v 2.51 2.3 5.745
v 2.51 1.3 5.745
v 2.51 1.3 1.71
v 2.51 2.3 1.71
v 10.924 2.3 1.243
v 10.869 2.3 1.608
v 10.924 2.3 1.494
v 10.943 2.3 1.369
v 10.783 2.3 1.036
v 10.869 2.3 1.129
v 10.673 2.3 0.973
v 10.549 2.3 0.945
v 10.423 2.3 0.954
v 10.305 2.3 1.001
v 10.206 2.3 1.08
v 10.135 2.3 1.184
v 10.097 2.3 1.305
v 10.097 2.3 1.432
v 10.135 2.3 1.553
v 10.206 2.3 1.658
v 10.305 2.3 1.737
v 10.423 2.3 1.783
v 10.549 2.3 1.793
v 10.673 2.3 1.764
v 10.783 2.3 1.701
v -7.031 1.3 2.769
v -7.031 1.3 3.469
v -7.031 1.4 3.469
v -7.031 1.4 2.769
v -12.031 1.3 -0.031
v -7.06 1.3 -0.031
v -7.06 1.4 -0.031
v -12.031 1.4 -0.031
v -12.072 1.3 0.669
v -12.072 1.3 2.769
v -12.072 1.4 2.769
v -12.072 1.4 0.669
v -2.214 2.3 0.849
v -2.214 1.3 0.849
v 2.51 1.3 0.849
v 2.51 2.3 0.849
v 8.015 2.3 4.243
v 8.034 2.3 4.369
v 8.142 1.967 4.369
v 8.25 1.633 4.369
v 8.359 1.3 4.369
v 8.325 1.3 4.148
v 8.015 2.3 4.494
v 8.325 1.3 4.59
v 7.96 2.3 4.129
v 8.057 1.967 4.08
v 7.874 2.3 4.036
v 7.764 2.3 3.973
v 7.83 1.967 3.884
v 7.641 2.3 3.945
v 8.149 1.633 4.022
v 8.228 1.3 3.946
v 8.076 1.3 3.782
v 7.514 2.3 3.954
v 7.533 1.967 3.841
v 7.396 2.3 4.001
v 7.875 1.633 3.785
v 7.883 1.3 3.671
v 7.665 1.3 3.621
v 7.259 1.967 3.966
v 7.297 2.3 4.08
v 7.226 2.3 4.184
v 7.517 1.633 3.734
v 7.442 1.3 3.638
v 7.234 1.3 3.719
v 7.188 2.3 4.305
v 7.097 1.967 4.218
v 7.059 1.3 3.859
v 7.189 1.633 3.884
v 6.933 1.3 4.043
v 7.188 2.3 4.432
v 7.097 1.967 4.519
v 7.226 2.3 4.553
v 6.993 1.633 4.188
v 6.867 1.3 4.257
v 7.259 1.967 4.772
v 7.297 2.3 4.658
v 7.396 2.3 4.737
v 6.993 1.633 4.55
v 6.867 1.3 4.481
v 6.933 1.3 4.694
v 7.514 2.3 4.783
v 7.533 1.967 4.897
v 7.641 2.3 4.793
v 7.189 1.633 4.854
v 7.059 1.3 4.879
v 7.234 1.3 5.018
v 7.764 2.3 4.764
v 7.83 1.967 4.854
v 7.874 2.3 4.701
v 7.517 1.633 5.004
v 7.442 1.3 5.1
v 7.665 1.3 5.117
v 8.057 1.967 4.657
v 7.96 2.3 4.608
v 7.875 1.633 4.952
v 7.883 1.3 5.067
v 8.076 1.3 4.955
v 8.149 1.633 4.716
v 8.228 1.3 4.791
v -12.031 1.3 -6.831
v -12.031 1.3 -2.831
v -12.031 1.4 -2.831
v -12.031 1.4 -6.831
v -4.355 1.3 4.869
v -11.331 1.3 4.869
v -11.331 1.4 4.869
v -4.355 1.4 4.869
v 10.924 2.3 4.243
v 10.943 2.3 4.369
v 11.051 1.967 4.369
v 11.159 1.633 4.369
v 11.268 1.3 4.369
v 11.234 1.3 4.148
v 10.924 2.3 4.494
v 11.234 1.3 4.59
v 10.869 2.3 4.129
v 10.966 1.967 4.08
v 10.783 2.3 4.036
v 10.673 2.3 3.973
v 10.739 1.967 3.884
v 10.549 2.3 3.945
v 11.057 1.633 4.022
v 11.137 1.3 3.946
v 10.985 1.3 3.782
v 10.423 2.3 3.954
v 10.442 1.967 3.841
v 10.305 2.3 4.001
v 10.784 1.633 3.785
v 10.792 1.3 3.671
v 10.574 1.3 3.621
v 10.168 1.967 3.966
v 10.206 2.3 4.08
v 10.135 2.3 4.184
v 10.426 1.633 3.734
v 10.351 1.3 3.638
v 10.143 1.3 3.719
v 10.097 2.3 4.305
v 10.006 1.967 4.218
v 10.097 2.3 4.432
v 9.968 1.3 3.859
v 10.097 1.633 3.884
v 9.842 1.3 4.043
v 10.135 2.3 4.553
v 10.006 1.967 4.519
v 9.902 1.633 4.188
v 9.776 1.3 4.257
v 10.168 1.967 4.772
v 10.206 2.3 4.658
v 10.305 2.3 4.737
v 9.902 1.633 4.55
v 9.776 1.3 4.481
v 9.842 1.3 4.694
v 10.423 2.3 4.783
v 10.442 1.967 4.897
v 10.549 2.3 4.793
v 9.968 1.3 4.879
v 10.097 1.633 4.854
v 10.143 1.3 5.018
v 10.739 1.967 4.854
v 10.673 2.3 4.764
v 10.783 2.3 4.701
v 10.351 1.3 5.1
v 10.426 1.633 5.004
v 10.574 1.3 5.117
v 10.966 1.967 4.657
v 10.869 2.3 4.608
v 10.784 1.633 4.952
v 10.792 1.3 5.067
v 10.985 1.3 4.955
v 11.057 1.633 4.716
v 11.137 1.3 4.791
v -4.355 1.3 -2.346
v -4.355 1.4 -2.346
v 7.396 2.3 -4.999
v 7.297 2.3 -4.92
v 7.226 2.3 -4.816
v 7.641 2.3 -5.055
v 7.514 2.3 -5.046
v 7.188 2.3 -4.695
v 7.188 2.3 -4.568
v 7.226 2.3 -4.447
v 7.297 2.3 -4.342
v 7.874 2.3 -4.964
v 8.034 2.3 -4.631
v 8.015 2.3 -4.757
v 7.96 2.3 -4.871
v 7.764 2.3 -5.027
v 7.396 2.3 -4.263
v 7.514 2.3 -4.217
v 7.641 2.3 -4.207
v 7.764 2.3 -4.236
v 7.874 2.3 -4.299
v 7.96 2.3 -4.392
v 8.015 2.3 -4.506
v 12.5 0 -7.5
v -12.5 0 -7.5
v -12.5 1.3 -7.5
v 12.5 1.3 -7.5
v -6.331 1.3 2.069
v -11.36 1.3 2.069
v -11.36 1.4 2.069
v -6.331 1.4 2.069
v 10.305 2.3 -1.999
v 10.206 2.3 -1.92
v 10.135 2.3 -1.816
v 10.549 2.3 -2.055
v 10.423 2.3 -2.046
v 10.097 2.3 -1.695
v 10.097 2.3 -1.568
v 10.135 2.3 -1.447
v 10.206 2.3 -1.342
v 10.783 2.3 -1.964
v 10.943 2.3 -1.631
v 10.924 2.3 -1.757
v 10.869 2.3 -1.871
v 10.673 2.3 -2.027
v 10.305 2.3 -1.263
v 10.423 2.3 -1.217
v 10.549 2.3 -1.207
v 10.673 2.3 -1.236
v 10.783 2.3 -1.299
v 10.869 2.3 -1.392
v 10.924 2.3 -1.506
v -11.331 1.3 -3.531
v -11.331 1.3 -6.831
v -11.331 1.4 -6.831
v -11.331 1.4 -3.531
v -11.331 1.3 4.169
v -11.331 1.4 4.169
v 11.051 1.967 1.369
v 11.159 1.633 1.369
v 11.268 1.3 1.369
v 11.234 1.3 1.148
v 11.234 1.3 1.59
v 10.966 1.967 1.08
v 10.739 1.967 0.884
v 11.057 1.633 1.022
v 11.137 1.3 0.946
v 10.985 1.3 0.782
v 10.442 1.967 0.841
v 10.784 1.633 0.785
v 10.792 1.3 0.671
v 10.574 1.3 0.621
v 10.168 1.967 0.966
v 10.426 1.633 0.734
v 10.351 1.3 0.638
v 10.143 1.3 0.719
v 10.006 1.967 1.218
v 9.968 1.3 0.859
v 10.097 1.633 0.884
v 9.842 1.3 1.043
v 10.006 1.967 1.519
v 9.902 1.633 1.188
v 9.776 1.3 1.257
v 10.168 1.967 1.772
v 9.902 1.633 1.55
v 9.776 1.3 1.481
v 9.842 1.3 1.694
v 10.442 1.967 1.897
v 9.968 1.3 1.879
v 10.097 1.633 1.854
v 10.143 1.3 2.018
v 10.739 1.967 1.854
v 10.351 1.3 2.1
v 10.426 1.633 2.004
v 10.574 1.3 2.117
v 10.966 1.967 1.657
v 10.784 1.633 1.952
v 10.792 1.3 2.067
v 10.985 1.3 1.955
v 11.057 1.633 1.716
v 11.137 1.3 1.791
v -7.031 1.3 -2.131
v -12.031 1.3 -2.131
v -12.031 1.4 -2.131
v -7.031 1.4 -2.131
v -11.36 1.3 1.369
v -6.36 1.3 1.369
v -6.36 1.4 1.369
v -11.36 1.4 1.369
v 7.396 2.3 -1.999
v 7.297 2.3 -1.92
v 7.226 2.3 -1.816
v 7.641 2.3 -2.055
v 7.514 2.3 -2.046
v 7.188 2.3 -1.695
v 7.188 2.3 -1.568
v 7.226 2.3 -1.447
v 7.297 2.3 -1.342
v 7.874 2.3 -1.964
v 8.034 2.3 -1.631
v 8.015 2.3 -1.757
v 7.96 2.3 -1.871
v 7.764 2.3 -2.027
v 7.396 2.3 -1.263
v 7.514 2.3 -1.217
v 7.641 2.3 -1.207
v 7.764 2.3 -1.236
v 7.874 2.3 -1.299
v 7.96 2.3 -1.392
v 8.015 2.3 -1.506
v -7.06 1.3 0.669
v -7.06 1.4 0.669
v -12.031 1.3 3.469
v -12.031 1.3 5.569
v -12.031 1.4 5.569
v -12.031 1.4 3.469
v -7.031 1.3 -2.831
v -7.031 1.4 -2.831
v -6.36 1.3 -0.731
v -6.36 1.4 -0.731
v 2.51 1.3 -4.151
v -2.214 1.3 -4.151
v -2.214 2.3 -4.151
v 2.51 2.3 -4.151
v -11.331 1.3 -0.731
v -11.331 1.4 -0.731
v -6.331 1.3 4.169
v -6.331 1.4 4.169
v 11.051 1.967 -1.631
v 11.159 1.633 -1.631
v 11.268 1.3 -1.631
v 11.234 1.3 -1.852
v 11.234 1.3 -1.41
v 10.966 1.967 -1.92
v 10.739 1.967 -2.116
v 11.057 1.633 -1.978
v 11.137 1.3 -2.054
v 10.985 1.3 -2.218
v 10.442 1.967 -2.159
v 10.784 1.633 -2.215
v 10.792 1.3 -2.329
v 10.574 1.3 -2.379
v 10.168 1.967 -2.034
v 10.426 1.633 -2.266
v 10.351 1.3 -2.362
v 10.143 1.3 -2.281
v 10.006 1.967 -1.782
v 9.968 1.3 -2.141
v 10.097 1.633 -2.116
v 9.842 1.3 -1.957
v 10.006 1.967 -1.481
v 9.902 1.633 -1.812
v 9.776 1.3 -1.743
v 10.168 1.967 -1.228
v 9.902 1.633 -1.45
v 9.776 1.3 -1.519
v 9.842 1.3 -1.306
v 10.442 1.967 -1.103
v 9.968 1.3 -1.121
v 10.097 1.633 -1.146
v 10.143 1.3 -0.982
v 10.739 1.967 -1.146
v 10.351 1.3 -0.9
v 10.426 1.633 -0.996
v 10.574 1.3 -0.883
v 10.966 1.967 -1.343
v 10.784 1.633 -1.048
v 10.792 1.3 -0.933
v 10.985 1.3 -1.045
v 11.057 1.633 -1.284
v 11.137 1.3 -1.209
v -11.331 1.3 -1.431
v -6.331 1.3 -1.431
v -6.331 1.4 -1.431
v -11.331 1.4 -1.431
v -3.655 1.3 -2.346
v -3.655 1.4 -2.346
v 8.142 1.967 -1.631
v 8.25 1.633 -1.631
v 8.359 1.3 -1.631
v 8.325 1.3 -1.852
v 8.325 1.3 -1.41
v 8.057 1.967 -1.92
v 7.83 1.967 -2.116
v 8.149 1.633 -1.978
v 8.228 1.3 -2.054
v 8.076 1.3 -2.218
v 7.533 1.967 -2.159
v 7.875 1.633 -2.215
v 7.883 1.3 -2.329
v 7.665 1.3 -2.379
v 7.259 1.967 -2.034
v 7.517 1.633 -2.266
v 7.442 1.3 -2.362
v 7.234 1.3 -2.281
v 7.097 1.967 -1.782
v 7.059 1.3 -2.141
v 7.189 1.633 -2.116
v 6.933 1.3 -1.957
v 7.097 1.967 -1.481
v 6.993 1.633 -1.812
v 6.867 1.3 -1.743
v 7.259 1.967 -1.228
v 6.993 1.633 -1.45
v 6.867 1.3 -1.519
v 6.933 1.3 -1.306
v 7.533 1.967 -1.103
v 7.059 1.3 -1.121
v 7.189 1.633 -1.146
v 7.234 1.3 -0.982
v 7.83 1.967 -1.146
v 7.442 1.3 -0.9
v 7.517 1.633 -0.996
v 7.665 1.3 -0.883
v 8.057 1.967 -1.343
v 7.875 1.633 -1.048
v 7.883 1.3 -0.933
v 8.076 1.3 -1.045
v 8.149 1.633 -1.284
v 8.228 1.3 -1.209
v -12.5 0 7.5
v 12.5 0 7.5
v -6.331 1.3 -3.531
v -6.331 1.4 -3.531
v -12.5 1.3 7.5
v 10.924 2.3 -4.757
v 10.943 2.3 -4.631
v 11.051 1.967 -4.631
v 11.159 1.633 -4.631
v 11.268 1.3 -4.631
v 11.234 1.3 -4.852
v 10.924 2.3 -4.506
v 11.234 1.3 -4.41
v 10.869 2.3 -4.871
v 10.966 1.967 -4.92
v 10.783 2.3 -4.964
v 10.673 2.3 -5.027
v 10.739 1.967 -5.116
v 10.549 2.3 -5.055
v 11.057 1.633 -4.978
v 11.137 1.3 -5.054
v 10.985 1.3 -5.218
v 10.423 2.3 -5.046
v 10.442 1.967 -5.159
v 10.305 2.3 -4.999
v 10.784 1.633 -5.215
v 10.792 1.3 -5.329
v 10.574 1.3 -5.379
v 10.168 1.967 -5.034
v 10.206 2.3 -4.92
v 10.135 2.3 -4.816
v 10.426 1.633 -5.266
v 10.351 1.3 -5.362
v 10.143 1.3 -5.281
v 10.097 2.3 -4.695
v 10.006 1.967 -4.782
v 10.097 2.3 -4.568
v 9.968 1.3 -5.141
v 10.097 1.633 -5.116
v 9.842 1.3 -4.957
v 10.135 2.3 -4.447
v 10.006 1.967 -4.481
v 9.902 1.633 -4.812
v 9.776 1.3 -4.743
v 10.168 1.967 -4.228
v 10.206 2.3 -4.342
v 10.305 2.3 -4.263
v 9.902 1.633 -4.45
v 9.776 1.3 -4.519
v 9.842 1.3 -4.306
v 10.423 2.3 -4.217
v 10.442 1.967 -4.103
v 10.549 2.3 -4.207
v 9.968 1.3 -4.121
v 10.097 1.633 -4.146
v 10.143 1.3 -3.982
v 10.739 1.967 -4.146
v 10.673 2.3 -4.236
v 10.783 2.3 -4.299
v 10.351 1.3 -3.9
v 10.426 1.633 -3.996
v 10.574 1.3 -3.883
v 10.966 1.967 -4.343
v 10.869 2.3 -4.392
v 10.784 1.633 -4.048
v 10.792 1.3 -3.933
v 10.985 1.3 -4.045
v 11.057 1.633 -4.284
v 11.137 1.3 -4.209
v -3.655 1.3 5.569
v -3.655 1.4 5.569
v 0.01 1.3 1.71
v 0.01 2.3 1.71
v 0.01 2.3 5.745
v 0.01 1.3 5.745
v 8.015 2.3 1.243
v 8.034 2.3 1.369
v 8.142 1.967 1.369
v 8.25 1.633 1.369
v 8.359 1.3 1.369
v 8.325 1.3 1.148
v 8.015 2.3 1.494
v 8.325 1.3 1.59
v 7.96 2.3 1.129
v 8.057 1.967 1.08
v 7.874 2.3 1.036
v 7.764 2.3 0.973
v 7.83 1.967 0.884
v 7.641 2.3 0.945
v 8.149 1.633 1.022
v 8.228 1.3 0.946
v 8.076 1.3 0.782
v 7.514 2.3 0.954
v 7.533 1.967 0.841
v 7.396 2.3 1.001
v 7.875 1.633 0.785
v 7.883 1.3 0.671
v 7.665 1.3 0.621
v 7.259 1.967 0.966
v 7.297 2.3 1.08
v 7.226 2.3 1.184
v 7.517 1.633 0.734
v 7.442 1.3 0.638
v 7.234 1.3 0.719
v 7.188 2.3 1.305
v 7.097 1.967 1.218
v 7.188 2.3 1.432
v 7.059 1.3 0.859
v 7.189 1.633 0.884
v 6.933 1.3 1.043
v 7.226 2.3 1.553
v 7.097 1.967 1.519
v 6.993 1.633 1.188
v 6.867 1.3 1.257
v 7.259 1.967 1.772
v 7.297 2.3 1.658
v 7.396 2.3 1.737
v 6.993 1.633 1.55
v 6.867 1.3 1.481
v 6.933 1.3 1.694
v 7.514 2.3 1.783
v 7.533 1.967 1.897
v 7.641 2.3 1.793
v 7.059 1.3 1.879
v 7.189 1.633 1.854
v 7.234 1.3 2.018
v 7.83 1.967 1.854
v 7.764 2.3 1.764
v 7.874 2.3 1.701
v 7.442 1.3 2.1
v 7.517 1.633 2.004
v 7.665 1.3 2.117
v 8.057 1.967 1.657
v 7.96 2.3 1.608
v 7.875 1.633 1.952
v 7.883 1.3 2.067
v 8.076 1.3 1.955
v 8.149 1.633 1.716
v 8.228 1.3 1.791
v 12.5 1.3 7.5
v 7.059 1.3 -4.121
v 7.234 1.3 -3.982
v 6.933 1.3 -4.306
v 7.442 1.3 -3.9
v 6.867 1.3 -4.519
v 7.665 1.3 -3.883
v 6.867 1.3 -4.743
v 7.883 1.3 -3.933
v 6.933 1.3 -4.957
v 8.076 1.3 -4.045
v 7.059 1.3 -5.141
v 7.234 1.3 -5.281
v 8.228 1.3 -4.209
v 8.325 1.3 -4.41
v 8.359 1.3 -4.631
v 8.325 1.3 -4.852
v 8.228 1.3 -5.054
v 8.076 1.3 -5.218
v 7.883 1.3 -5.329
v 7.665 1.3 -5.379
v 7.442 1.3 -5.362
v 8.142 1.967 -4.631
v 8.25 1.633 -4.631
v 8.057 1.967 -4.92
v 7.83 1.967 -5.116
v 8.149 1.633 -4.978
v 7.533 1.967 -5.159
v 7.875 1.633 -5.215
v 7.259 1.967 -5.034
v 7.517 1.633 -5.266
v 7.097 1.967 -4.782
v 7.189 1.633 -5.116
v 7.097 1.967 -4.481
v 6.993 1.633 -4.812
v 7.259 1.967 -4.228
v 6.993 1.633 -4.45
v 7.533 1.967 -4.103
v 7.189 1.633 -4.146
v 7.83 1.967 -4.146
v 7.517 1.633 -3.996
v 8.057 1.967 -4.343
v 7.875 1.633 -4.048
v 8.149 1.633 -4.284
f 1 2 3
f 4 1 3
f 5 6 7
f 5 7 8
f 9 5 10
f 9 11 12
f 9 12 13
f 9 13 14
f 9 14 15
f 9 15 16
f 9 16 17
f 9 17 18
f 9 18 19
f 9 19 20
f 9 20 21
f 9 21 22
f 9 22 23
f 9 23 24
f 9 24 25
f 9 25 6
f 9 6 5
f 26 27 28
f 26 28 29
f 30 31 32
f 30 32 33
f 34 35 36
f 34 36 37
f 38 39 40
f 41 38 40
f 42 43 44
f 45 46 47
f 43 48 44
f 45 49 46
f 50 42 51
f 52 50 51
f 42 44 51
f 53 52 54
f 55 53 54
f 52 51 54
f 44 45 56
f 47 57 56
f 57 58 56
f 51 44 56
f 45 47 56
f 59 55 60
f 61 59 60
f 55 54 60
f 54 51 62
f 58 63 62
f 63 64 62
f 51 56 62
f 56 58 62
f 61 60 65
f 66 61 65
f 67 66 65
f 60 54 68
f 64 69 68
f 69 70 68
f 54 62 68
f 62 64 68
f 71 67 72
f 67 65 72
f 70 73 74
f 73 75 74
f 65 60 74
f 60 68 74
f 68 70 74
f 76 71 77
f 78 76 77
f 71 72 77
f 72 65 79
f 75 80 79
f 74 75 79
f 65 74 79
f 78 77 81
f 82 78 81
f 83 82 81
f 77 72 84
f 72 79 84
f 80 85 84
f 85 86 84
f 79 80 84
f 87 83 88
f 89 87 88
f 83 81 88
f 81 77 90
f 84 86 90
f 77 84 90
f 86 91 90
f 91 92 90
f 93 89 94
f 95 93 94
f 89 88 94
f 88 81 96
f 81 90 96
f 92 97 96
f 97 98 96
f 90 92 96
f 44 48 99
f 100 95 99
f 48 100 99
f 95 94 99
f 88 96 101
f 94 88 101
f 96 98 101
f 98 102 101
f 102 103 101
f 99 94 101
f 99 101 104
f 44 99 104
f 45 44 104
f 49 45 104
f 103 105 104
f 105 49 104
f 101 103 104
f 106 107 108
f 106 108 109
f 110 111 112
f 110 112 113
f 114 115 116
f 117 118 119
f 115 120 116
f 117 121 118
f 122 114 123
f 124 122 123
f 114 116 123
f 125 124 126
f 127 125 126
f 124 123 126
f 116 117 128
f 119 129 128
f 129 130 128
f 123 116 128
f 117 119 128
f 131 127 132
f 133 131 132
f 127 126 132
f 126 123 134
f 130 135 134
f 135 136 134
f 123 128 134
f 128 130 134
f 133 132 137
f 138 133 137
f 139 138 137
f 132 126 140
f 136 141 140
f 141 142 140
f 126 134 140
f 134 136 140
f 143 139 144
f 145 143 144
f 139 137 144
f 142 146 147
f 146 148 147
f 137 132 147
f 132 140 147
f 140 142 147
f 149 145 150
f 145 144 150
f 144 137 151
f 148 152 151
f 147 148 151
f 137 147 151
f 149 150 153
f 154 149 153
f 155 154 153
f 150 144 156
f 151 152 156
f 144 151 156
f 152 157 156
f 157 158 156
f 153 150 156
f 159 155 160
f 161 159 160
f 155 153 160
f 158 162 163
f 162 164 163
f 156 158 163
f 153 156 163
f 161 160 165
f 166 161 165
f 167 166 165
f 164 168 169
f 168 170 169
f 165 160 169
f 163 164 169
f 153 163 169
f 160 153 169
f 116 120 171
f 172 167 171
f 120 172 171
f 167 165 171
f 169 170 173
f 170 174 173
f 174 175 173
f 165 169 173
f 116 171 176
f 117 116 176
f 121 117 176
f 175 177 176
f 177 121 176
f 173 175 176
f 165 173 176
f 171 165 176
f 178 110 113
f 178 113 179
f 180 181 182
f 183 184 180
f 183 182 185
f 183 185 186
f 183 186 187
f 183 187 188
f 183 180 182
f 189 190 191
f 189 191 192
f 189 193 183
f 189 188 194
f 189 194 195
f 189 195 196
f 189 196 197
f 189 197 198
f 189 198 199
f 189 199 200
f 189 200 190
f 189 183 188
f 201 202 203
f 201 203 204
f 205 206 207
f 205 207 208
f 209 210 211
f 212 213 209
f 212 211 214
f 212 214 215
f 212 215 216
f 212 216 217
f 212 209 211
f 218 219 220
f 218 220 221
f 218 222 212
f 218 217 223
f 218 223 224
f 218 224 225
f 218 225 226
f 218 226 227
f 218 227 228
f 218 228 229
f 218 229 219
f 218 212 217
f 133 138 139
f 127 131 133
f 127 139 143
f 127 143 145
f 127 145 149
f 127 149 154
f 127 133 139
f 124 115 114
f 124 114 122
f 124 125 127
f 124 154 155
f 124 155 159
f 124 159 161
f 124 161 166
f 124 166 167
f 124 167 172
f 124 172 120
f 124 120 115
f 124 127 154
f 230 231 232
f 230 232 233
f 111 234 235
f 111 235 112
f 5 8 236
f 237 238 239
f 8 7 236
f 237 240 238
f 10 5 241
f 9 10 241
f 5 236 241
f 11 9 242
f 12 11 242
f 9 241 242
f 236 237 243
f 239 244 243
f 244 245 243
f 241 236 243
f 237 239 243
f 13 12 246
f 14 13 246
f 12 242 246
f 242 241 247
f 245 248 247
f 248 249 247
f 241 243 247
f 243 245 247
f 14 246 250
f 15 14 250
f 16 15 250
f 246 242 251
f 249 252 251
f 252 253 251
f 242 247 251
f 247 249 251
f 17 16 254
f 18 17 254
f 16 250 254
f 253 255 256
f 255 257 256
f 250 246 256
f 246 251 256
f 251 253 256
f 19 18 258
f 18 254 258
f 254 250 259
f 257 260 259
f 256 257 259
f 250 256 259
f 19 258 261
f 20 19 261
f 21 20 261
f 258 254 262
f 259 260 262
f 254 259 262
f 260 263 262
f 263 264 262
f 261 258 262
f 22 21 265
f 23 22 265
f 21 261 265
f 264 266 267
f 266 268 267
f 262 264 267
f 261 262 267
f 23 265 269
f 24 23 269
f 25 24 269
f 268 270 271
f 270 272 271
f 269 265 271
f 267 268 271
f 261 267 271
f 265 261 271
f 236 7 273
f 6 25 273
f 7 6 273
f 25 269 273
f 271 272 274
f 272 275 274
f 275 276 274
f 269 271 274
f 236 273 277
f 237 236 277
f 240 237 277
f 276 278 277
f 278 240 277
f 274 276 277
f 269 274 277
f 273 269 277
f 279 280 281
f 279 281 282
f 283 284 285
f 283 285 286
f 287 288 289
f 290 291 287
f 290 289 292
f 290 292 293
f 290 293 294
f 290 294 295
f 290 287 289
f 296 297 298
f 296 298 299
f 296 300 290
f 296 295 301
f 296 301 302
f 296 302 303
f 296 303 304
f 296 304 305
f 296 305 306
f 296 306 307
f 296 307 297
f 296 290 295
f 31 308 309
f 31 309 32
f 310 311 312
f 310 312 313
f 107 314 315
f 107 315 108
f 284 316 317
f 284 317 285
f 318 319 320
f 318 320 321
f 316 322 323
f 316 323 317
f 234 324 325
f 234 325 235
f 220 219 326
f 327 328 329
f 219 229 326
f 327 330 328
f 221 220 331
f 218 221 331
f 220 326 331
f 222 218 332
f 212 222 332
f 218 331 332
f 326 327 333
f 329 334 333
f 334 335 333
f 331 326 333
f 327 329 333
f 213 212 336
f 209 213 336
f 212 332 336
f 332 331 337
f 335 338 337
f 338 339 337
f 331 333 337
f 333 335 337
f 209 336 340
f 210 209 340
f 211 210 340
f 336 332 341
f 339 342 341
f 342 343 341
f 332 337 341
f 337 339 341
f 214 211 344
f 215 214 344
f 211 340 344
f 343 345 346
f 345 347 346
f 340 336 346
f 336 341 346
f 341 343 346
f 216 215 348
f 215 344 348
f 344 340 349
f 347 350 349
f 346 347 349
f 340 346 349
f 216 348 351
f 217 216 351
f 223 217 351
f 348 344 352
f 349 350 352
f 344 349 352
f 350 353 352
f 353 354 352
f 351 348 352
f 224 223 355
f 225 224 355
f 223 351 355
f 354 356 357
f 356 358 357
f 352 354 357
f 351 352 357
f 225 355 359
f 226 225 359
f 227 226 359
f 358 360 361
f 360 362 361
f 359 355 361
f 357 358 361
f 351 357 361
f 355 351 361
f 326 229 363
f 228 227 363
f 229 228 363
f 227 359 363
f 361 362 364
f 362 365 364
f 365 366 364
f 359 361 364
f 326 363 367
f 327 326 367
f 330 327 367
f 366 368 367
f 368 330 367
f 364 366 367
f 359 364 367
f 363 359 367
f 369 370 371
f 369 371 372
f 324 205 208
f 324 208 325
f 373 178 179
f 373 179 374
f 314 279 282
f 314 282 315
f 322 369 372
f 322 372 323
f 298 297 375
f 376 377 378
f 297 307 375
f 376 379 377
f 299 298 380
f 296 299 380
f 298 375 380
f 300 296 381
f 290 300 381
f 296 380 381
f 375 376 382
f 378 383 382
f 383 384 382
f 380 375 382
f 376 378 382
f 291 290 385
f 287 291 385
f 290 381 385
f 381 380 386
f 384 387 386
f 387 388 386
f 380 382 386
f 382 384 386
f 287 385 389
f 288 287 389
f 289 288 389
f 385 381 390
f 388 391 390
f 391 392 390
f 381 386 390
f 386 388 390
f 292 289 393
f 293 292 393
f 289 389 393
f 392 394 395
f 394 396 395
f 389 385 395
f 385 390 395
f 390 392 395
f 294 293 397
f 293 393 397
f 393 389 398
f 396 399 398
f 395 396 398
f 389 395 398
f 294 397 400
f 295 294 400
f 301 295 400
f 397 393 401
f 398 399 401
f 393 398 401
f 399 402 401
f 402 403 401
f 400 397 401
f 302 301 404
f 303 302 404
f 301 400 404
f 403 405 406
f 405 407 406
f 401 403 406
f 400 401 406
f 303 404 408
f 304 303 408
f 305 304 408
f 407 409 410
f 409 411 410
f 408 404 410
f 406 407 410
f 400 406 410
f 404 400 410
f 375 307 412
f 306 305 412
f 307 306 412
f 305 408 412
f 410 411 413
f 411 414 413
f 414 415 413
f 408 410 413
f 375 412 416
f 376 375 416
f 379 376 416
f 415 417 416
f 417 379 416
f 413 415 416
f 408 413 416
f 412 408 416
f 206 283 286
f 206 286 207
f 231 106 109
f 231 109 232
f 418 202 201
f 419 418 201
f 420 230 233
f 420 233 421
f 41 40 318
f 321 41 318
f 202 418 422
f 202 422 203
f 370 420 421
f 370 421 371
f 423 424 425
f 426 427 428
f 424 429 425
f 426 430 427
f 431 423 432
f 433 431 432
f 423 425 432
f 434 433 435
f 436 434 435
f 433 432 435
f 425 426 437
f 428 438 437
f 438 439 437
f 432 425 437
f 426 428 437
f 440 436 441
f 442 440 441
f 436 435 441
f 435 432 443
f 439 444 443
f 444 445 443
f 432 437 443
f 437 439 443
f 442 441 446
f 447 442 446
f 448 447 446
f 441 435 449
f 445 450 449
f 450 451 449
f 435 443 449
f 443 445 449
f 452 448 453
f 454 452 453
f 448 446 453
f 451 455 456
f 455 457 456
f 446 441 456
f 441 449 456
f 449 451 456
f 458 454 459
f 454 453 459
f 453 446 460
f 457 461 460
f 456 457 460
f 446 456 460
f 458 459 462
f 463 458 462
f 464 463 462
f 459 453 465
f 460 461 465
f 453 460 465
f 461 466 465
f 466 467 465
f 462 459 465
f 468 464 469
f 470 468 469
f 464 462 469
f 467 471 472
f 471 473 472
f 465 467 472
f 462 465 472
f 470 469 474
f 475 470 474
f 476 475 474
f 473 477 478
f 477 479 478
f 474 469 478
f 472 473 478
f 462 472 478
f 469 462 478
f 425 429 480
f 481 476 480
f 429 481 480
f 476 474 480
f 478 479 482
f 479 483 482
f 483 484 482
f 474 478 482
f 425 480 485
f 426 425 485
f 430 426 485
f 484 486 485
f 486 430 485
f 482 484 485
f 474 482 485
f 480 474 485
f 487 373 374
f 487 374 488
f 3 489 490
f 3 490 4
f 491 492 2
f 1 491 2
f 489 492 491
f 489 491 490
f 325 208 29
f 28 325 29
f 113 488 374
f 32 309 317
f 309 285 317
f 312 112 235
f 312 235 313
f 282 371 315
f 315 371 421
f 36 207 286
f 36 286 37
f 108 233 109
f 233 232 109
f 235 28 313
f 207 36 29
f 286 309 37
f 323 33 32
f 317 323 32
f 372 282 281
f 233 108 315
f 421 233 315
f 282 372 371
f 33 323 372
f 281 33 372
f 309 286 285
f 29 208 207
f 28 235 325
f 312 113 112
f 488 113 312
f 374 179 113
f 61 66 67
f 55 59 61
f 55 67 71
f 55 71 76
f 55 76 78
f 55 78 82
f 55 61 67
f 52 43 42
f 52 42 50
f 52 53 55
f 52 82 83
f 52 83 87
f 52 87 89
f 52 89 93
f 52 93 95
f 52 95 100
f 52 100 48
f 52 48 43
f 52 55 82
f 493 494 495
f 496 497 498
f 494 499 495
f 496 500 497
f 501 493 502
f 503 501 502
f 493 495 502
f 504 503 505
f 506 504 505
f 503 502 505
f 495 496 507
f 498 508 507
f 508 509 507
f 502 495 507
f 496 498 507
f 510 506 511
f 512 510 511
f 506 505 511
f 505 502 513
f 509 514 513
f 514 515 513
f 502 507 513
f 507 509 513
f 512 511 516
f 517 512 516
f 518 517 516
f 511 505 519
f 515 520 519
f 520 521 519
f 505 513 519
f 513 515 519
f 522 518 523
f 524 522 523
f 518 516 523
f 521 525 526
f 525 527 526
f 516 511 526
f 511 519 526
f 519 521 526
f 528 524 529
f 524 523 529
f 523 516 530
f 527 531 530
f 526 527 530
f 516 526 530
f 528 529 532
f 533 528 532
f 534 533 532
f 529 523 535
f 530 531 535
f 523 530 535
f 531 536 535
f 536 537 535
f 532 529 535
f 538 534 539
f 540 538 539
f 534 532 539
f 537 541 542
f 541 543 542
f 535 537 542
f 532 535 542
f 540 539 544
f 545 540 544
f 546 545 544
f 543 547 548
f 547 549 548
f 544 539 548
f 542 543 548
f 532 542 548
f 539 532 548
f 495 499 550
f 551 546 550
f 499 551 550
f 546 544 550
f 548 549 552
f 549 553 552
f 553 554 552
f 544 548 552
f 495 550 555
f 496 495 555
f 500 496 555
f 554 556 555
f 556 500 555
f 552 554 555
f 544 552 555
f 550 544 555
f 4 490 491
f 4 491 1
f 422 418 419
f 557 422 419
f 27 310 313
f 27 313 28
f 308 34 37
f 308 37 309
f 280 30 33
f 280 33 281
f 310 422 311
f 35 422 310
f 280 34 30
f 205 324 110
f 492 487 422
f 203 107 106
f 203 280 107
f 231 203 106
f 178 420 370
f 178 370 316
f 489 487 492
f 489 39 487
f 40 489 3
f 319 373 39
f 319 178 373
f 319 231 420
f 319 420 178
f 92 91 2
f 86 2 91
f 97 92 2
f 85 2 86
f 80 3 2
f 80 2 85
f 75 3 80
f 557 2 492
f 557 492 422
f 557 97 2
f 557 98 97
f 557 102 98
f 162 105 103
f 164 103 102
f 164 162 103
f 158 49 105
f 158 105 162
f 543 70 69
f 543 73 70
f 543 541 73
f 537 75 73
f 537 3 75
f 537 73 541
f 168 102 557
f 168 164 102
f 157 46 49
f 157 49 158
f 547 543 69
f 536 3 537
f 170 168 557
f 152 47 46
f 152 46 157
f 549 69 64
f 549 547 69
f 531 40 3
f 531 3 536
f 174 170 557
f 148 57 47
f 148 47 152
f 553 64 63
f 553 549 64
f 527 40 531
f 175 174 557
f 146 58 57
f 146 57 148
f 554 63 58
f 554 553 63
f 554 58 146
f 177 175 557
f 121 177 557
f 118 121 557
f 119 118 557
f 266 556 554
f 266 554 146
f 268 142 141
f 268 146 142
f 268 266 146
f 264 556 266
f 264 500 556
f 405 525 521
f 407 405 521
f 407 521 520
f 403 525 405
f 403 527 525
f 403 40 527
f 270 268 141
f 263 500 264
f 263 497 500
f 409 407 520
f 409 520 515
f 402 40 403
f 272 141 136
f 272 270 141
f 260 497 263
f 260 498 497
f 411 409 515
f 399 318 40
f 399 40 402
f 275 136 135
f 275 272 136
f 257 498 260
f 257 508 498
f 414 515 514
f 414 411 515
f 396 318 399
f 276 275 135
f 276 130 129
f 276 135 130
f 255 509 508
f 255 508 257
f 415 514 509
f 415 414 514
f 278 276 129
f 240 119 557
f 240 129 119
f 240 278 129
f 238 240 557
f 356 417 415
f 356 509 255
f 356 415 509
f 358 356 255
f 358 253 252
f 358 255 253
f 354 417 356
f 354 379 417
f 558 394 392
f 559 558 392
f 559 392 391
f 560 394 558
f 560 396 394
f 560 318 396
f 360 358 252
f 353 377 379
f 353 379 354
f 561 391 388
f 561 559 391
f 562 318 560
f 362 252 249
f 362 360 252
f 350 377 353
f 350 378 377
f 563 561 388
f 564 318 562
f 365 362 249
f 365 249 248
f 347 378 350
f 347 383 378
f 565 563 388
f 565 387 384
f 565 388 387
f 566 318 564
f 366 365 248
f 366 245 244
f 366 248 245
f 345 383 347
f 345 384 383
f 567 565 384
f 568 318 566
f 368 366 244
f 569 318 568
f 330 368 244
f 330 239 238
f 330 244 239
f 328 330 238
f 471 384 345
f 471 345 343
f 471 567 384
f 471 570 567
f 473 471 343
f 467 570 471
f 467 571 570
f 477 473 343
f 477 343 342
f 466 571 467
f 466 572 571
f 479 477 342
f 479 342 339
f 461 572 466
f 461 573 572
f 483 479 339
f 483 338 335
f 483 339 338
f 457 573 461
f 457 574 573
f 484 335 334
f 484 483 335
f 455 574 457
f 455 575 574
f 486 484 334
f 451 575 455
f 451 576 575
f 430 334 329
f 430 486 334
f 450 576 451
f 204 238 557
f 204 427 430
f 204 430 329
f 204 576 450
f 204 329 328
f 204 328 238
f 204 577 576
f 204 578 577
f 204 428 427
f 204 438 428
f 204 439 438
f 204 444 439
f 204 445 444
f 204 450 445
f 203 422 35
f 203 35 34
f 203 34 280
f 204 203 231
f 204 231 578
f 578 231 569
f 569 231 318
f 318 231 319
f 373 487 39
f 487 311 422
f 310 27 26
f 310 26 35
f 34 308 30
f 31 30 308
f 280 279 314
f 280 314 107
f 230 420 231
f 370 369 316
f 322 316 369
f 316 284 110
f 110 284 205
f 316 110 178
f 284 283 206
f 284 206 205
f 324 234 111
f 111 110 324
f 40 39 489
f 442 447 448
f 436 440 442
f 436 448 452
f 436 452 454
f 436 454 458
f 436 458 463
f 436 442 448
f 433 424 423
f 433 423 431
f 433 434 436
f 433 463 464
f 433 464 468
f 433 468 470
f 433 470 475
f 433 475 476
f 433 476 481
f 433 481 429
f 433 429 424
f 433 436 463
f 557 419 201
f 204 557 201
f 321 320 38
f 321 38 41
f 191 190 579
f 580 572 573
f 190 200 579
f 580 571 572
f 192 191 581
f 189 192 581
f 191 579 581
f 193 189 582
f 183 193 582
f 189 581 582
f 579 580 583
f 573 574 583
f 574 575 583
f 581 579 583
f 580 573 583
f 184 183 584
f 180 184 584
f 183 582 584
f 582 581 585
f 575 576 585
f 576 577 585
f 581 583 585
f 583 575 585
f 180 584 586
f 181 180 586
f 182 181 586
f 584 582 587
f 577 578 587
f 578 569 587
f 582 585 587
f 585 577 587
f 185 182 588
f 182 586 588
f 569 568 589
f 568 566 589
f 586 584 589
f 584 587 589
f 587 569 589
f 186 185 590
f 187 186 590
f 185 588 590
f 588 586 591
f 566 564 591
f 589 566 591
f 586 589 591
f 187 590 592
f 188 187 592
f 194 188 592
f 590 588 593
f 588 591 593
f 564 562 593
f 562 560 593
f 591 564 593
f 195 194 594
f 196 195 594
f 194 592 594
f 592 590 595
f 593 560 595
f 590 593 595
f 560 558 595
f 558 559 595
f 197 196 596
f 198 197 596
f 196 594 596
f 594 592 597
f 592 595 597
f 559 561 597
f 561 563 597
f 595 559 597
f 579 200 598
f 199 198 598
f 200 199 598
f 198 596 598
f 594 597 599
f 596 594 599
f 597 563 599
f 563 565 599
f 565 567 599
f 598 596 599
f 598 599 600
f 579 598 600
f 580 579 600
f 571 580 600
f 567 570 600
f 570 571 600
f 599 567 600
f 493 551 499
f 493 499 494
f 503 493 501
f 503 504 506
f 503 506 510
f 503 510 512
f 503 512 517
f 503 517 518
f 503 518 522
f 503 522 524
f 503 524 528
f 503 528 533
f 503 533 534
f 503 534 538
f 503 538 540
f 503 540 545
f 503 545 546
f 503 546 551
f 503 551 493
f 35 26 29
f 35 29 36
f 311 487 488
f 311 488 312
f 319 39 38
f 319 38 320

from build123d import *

# Parameters (mm, degrees)
SKETCH1_W                     = 25
SKETCH1_H                     = 15
BOSS_EXTRUDE1_DEPTH           = 1.3
BOSS_EXTRUDE2_DEPTH           = 0.1
SKETCH3_W                     = 4.723765288
SKETCH3_H                     = 5
SKETCH3_W_2                   = 2.5
SKETCH3_H_2                   = 4.03488285
BOSS_EXTRUDE3_DEPTH           = 1
SKETCH4_R                     = 0.75
BOSS_EXTRUDE4_DEPTH           = 1
BOSS_EXTRUDE4_DRAFT           = 18
BOSS_EXTRUDE4_PROFILE_2_DEPTH = 1
BOSS_EXTRUDE4_PROFILE_2_DRAFT = 18
BOSS_EXTRUDE4_PROFILE_3_DEPTH = 1
BOSS_EXTRUDE4_PROFILE_3_DRAFT = 18
BOSS_EXTRUDE4_PROFILE_4_DEPTH = 1
BOSS_EXTRUDE4_PROFILE_4_DRAFT = 18
BOSS_EXTRUDE4_PROFILE_5_DEPTH = 1
BOSS_EXTRUDE4_PROFILE_5_DRAFT = 18
BOSS_EXTRUDE4_PROFILE_6_DEPTH = 1
BOSS_EXTRUDE4_PROFILE_6_DRAFT = 18
BOSS_EXTRUDE4_PROFILE_7_DEPTH = 1
BOSS_EXTRUDE4_PROFILE_7_DRAFT = 18
BOSS_EXTRUDE4_PROFILE_8_DEPTH = 1
BOSS_EXTRUDE4_PROFILE_8_DRAFT = 18


with BuildPart() as part:
    # Sketch1 → Boss-Extrude1 (new body)
    with BuildSketch(Plane(origin=(0, 0, 0), x_dir=(1, 0, 0), z_dir=(0, 1, 0))):
        Rectangle(SKETCH1_W, SKETCH1_H)
    extrude(amount=BOSS_EXTRUDE1_DEPTH)

    # Sketch2 → Boss-Extrude2 (add)
    with BuildSketch(Plane(origin=(0, 1.3, 0), x_dir=(1, 0, 0), z_dir=(0, 1, 0))):
        Polygon((-3.654721125, -5.569339468), (-12.030839718, -5.569339468), (-12.030839718, -3.469339468), (-7.030839718, -3.469339468), (-7.030839718, -2.769339468), (-12.071748872, -2.769339468), (-12.071748872, -0.669339468), (-7.060469733, -0.669339468), (-7.060469733, 0.030660532), (-12.030839718, 0.030660532), (-12.030839718, 2.130660532), (-7.030839718, 2.130660532), (-7.030839718, 2.830660532), (-12.030839718, 2.830660532), (-12.030839718, 6.830660532), (-11.330839718, 6.830660532), (-11.330839718, 3.530660532), (-6.330839718, 3.530660532), (-6.330839718, 1.430660532), (-11.330839718, 1.430660532), (-11.330839718, 0.730660532), (-6.360469733, 0.730660532), (-6.360469733, -1.369339468), (-11.360469733, -1.369339468), (-11.360469733, -2.069339468), (-6.330839718, -2.069339468), (-6.330839718, -4.169339468), (-11.330839718, -4.169339468), (-11.330839718, -4.869339468), (-4.354721125, -4.869339468), (-4.354721125, 2.346150012), (-3.654721125, 2.346150012), align=None)
    extrude(amount=BOSS_EXTRUDE2_DEPTH)

    # Sketch3 → Boss-Extrude3 (add)
    with BuildSketch(Plane(origin=(0, 1.3, 0), x_dir=(1, 0, 0), z_dir=(0, 1, 0))):
        with Locations((0.147617665, 1.651198425)):
            Rectangle(SKETCH3_W, SKETCH3_H)
        with Locations((1.259500309, -3.727346048)):
            Rectangle(SKETCH3_W_2, SKETCH3_H_2)
    extrude(amount=BOSS_EXTRUDE3_DEPTH)


with BuildPart() as boss_extrude4_tool:
    # Sketch4 → Boss-Extrude4 (with draft: the straight prism first)
    with BuildSketch(Plane(origin=(0, 1.3, 0), x_dir=(1, 0, 0), z_dir=(0, 1, 0))):
        with Locations((7.608740396, 4.631238018)):
            Circle(SKETCH4_R)
    extrude(amount=BOSS_EXTRUDE4_DEPTH)
    # Boss-Extrude4: the draft: its side faces are tilted about the plane it starts from
    boss_extrude4_sides = [boss_extrude4_tool.faces().sort_by_distance(p)[0] for p in [
        (6.858740396, 1.8, -4.631238018),
    ]]
    draft(boss_extrude4_sides, Plane(origin=(0, 1.3, 0), x_dir=(1, 0, 0), z_dir=(0, 1, 0)), BOSS_EXTRUDE4_DRAFT)


with BuildPart() as part_1:
    add(part.part)

    # Boss-Extrude4: add boss_extrude4_tool
    add(boss_extrude4_tool.part)


with BuildPart() as boss_extrude4_profile_2_tool:
    # Sketch4 → Boss-Extrude4 profile 2 (with draft: the straight prism first)
    with BuildSketch(Plane(origin=(0, 1.3, 0), x_dir=(1, 0, 0), z_dir=(0, 1, 0))):
        with Locations((10.517617168, 4.631238018)):
            Circle(SKETCH4_R)
    extrude(amount=BOSS_EXTRUDE4_PROFILE_2_DEPTH)
    # Boss-Extrude4 profile 2: the draft: its side faces are tilted about the plane it starts from
    boss_extrude4_profile_2_sides = [boss_extrude4_profile_2_tool.faces().sort_by_distance(p)[0] for p in [
        (9.767617168, 1.8, -4.631238018),
    ]]
    draft(boss_extrude4_profile_2_sides, Plane(origin=(0, 1.3, 0), x_dir=(1, 0, 0), z_dir=(0, 1, 0)), BOSS_EXTRUDE4_PROFILE_2_DRAFT)


with BuildPart() as part_2:
    add(part_1.part)

    # Boss-Extrude4 profile 2: add boss_extrude4_profile_2_tool
    add(boss_extrude4_profile_2_tool.part)


with BuildPart() as boss_extrude4_profile_3_tool:
    # Sketch4 → Boss-Extrude4 profile 3 (with draft: the straight prism first)
    with BuildSketch(Plane(origin=(0, 1.3, 0), x_dir=(1, 0, 0), z_dir=(0, 1, 0))):
        with Locations((7.608740396, 1.631238018)):
            Circle(SKETCH4_R)
    extrude(amount=BOSS_EXTRUDE4_PROFILE_3_DEPTH)
    # Boss-Extrude4 profile 3: the draft: its side faces are tilted about the plane it starts from
    boss_extrude4_profile_3_sides = [boss_extrude4_profile_3_tool.faces().sort_by_distance(p)[0] for p in [
        (6.858740396, 1.8, -1.631238018),
    ]]
    draft(boss_extrude4_profile_3_sides, Plane(origin=(0, 1.3, 0), x_dir=(1, 0, 0), z_dir=(0, 1, 0)), BOSS_EXTRUDE4_PROFILE_3_DRAFT)


with BuildPart() as part_3:
    add(part_2.part)

    # Boss-Extrude4 profile 3: add boss_extrude4_profile_3_tool
    add(boss_extrude4_profile_3_tool.part)


with BuildPart() as boss_extrude4_profile_4_tool:
    # Sketch4 → Boss-Extrude4 profile 4 (with draft: the straight prism first)
    with BuildSketch(Plane(origin=(0, 1.3, 0), x_dir=(1, 0, 0), z_dir=(0, 1, 0))):
        with Locations((10.517617168, 1.631238018)):
            Circle(SKETCH4_R)
    extrude(amount=BOSS_EXTRUDE4_PROFILE_4_DEPTH)
    # Boss-Extrude4 profile 4: the draft: its side faces are tilted about the plane it starts from
    boss_extrude4_profile_4_sides = [boss_extrude4_profile_4_tool.faces().sort_by_distance(p)[0] for p in [
        (9.767617168, 1.8, -1.631238018),
    ]]
    draft(boss_extrude4_profile_4_sides, Plane(origin=(0, 1.3, 0), x_dir=(1, 0, 0), z_dir=(0, 1, 0)), BOSS_EXTRUDE4_PROFILE_4_DRAFT)


with BuildPart() as part_4:
    add(part_3.part)

    # Boss-Extrude4 profile 4: add boss_extrude4_profile_4_tool
    add(boss_extrude4_profile_4_tool.part)


with BuildPart() as boss_extrude4_profile_5_tool:
    # Sketch4 → Boss-Extrude4 profile 5 (with draft: the straight prism first)
    with BuildSketch(Plane(origin=(0, 1.3, 0), x_dir=(1, 0, 0), z_dir=(0, 1, 0))):
        with Locations((7.608740396, -1.368761982)):
            Circle(SKETCH4_R)
    extrude(amount=BOSS_EXTRUDE4_PROFILE_5_DEPTH)
    # Boss-Extrude4 profile 5: the draft: its side faces are tilted about the plane it starts from
    boss_extrude4_profile_5_sides = [boss_extrude4_profile_5_tool.faces().sort_by_distance(p)[0] for p in [
        (6.858740396, 1.8, 1.368761982),
    ]]
    draft(boss_extrude4_profile_5_sides, Plane(origin=(0, 1.3, 0), x_dir=(1, 0, 0), z_dir=(0, 1, 0)), BOSS_EXTRUDE4_PROFILE_5_DRAFT)


with BuildPart() as part_5:
    add(part_4.part)

    # Boss-Extrude4 profile 5: add boss_extrude4_profile_5_tool
    add(boss_extrude4_profile_5_tool.part)


with BuildPart() as boss_extrude4_profile_6_tool:
    # Sketch4 → Boss-Extrude4 profile 6 (with draft: the straight prism first)
    with BuildSketch(Plane(origin=(0, 1.3, 0), x_dir=(1, 0, 0), z_dir=(0, 1, 0))):
        with Locations((10.517617168, -1.368761982)):
            Circle(SKETCH4_R)
    extrude(amount=BOSS_EXTRUDE4_PROFILE_6_DEPTH)
    # Boss-Extrude4 profile 6: the draft: its side faces are tilted about the plane it starts from
    boss_extrude4_profile_6_sides = [boss_extrude4_profile_6_tool.faces().sort_by_distance(p)[0] for p in [
        (9.767617168, 1.8, 1.368761982),
    ]]
    draft(boss_extrude4_profile_6_sides, Plane(origin=(0, 1.3, 0), x_dir=(1, 0, 0), z_dir=(0, 1, 0)), BOSS_EXTRUDE4_PROFILE_6_DRAFT)


with BuildPart() as part_6:
    add(part_5.part)

    # Boss-Extrude4 profile 6: add boss_extrude4_profile_6_tool
    add(boss_extrude4_profile_6_tool.part)


with BuildPart() as boss_extrude4_profile_7_tool:
    # Sketch4 → Boss-Extrude4 profile 7 (with draft: the straight prism first)
    with BuildSketch(Plane(origin=(0, 1.3, 0), x_dir=(1, 0, 0), z_dir=(0, 1, 0))):
        with Locations((7.608740396, -4.368761982)):
            Circle(SKETCH4_R)
    extrude(amount=BOSS_EXTRUDE4_PROFILE_7_DEPTH)
    # Boss-Extrude4 profile 7: the draft: its side faces are tilted about the plane it starts from
    boss_extrude4_profile_7_sides = [boss_extrude4_profile_7_tool.faces().sort_by_distance(p)[0] for p in [
        (6.858740396, 1.8, 4.368761982),
    ]]
    draft(boss_extrude4_profile_7_sides, Plane(origin=(0, 1.3, 0), x_dir=(1, 0, 0), z_dir=(0, 1, 0)), BOSS_EXTRUDE4_PROFILE_7_DRAFT)


with BuildPart() as part_7:
    add(part_6.part)

    # Boss-Extrude4 profile 7: add boss_extrude4_profile_7_tool
    add(boss_extrude4_profile_7_tool.part)


with BuildPart() as boss_extrude4_profile_8_tool:
    # Sketch4 → Boss-Extrude4 profile 8 (with draft: the straight prism first)
    with BuildSketch(Plane(origin=(0, 1.3, 0), x_dir=(1, 0, 0), z_dir=(0, 1, 0))):
        with Locations((10.517617168, -4.368761982)):
            Circle(SKETCH4_R)
    extrude(amount=BOSS_EXTRUDE4_PROFILE_8_DEPTH)
    # Boss-Extrude4 profile 8: the draft: its side faces are tilted about the plane it starts from
    boss_extrude4_profile_8_sides = [boss_extrude4_profile_8_tool.faces().sort_by_distance(p)[0] for p in [
        (9.767617168, 1.8, 4.368761982),
    ]]
    draft(boss_extrude4_profile_8_sides, Plane(origin=(0, 1.3, 0), x_dir=(1, 0, 0), z_dir=(0, 1, 0)), BOSS_EXTRUDE4_PROFILE_8_DRAFT)


with BuildPart() as part_8:
    add(part_7.part)

    # Boss-Extrude4 profile 8: add boss_extrude4_profile_8_tool
    add(boss_extrude4_profile_8_tool.part)


solid = part_8.part
